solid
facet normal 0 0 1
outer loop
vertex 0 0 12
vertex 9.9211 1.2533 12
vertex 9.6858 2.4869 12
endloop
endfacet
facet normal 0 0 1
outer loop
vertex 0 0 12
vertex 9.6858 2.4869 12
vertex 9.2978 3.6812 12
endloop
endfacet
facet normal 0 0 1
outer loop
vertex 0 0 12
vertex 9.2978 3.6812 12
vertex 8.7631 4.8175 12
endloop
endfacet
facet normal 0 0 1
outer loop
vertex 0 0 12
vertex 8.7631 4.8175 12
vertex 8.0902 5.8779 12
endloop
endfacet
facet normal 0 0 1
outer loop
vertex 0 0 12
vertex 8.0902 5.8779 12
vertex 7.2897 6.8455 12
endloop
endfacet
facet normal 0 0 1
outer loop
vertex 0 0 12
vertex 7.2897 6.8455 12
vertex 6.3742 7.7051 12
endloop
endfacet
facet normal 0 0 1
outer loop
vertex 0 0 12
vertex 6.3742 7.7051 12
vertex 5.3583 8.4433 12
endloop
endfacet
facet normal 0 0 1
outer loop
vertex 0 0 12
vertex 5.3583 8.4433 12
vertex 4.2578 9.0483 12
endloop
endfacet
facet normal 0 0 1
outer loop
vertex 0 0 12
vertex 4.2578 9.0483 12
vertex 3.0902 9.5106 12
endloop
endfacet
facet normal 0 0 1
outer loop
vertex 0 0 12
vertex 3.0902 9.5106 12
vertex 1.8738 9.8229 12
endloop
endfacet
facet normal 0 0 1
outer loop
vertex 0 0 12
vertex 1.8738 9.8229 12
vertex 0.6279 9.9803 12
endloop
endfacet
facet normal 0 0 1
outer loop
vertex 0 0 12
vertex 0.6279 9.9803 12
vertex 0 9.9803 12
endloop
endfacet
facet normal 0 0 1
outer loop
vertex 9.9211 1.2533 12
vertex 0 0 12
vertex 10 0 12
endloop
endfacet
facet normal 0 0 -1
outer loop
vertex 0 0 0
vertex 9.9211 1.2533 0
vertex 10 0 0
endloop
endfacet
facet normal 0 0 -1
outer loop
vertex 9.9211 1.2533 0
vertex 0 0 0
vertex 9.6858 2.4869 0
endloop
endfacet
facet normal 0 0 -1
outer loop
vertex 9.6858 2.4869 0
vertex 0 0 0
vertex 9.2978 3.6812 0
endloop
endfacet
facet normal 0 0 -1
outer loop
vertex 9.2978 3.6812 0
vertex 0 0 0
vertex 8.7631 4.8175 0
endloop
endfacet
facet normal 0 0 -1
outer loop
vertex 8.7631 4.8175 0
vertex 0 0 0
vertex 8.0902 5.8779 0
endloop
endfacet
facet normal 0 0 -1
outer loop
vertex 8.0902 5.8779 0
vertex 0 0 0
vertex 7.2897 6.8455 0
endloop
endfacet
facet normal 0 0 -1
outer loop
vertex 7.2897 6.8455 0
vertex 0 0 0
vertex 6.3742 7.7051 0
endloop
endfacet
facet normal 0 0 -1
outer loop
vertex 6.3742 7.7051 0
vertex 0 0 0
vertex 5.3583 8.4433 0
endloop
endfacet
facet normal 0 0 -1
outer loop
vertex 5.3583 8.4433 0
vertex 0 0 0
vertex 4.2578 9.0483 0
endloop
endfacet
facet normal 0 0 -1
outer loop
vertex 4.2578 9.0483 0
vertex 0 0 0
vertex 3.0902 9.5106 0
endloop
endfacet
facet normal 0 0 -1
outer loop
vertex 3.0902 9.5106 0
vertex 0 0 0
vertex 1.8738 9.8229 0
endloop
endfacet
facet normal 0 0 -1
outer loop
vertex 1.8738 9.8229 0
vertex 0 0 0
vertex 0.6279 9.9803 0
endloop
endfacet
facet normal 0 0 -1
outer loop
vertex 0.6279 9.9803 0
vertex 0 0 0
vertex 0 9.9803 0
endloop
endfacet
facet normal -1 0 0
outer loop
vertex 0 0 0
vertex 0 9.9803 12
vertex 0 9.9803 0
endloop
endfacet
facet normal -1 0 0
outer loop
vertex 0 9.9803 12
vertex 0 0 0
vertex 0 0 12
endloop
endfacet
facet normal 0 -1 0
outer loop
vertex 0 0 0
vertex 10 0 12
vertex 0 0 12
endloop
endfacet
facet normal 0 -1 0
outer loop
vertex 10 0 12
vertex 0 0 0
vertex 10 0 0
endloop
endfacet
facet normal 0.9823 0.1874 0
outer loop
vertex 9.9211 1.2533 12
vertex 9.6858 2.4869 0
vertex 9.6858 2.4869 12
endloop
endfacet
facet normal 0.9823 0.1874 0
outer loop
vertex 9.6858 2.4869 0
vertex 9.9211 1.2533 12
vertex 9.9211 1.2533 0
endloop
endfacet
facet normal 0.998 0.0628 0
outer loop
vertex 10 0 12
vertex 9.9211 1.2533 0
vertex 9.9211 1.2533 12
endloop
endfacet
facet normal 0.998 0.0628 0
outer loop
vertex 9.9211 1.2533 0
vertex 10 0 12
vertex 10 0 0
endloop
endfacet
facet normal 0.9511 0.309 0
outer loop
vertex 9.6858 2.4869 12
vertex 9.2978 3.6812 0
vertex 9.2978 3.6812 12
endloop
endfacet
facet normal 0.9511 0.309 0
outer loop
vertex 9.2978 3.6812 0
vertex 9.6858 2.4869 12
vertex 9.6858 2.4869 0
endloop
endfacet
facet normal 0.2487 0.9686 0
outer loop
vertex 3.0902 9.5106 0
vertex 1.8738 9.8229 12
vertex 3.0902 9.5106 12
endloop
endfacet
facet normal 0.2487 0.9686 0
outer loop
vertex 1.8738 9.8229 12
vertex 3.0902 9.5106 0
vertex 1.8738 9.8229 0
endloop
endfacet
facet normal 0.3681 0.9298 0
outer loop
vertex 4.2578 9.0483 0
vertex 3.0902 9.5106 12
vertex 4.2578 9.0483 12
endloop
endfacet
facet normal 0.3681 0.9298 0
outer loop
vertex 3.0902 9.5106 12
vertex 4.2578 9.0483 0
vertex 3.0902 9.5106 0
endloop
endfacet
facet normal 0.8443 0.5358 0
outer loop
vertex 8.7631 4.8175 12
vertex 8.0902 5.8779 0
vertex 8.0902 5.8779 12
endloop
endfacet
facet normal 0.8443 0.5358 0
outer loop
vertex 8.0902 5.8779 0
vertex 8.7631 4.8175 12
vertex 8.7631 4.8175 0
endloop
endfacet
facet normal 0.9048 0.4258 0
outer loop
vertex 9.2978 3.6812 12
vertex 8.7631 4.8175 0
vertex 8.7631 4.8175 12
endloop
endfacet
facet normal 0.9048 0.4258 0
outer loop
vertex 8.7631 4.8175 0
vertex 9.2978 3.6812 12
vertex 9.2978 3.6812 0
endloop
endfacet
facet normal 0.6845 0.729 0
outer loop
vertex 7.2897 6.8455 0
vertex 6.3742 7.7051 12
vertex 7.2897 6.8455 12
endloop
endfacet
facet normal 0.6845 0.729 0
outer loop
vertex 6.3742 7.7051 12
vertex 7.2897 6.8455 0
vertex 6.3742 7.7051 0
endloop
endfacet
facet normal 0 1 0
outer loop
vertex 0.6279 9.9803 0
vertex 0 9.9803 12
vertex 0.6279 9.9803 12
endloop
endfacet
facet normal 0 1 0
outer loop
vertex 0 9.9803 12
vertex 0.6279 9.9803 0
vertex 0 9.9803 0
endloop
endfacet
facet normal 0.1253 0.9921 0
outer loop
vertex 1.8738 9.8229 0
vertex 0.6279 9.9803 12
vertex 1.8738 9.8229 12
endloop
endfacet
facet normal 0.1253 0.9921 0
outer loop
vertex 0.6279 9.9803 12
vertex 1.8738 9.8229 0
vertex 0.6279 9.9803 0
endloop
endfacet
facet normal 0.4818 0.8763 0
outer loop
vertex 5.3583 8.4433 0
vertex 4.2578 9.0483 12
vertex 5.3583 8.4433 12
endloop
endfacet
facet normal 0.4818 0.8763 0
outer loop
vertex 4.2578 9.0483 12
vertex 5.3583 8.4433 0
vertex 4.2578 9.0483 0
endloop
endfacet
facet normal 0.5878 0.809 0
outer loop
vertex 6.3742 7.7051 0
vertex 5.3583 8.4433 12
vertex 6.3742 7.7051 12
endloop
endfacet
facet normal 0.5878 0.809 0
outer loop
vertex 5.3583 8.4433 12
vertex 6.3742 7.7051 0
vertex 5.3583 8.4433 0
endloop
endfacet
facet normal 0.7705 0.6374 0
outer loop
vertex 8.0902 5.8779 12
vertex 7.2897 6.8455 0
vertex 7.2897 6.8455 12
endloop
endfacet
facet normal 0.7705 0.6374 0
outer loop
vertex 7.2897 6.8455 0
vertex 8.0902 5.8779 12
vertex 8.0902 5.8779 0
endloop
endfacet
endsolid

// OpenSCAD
/*
Author: Dave Clucas 2021 Version 0.2
Create a quadrant shaped pillar for supporting an enclosure lid
*/
//Example
quadrant(w=10,r=0,h=12,fn=50, brim=0);


module quadrant(w=8, r=0,h=10, fn = 50, brim=0 ) {
    if (brim>0){
        translate([0,0,h]){
            difference(){
                cube([w,w,brim]);
                translate([2,2,0])
                cube([w,w,brim+0.1]);
            }
        }
    }

	intersection(){
		cube([w+r,w+r,h]);
		union(){
 			cylinder(h,w,w,$fn=fn);
				rotate_extrude(angle=360,convexity=10,$fn=fn){
				translate([w,0,0])
				difference(){   //fillet shape
					square(r);
					translate([r,r,0])
					circle(r,$fn=fn);
				}
			}
		}
	}
}
